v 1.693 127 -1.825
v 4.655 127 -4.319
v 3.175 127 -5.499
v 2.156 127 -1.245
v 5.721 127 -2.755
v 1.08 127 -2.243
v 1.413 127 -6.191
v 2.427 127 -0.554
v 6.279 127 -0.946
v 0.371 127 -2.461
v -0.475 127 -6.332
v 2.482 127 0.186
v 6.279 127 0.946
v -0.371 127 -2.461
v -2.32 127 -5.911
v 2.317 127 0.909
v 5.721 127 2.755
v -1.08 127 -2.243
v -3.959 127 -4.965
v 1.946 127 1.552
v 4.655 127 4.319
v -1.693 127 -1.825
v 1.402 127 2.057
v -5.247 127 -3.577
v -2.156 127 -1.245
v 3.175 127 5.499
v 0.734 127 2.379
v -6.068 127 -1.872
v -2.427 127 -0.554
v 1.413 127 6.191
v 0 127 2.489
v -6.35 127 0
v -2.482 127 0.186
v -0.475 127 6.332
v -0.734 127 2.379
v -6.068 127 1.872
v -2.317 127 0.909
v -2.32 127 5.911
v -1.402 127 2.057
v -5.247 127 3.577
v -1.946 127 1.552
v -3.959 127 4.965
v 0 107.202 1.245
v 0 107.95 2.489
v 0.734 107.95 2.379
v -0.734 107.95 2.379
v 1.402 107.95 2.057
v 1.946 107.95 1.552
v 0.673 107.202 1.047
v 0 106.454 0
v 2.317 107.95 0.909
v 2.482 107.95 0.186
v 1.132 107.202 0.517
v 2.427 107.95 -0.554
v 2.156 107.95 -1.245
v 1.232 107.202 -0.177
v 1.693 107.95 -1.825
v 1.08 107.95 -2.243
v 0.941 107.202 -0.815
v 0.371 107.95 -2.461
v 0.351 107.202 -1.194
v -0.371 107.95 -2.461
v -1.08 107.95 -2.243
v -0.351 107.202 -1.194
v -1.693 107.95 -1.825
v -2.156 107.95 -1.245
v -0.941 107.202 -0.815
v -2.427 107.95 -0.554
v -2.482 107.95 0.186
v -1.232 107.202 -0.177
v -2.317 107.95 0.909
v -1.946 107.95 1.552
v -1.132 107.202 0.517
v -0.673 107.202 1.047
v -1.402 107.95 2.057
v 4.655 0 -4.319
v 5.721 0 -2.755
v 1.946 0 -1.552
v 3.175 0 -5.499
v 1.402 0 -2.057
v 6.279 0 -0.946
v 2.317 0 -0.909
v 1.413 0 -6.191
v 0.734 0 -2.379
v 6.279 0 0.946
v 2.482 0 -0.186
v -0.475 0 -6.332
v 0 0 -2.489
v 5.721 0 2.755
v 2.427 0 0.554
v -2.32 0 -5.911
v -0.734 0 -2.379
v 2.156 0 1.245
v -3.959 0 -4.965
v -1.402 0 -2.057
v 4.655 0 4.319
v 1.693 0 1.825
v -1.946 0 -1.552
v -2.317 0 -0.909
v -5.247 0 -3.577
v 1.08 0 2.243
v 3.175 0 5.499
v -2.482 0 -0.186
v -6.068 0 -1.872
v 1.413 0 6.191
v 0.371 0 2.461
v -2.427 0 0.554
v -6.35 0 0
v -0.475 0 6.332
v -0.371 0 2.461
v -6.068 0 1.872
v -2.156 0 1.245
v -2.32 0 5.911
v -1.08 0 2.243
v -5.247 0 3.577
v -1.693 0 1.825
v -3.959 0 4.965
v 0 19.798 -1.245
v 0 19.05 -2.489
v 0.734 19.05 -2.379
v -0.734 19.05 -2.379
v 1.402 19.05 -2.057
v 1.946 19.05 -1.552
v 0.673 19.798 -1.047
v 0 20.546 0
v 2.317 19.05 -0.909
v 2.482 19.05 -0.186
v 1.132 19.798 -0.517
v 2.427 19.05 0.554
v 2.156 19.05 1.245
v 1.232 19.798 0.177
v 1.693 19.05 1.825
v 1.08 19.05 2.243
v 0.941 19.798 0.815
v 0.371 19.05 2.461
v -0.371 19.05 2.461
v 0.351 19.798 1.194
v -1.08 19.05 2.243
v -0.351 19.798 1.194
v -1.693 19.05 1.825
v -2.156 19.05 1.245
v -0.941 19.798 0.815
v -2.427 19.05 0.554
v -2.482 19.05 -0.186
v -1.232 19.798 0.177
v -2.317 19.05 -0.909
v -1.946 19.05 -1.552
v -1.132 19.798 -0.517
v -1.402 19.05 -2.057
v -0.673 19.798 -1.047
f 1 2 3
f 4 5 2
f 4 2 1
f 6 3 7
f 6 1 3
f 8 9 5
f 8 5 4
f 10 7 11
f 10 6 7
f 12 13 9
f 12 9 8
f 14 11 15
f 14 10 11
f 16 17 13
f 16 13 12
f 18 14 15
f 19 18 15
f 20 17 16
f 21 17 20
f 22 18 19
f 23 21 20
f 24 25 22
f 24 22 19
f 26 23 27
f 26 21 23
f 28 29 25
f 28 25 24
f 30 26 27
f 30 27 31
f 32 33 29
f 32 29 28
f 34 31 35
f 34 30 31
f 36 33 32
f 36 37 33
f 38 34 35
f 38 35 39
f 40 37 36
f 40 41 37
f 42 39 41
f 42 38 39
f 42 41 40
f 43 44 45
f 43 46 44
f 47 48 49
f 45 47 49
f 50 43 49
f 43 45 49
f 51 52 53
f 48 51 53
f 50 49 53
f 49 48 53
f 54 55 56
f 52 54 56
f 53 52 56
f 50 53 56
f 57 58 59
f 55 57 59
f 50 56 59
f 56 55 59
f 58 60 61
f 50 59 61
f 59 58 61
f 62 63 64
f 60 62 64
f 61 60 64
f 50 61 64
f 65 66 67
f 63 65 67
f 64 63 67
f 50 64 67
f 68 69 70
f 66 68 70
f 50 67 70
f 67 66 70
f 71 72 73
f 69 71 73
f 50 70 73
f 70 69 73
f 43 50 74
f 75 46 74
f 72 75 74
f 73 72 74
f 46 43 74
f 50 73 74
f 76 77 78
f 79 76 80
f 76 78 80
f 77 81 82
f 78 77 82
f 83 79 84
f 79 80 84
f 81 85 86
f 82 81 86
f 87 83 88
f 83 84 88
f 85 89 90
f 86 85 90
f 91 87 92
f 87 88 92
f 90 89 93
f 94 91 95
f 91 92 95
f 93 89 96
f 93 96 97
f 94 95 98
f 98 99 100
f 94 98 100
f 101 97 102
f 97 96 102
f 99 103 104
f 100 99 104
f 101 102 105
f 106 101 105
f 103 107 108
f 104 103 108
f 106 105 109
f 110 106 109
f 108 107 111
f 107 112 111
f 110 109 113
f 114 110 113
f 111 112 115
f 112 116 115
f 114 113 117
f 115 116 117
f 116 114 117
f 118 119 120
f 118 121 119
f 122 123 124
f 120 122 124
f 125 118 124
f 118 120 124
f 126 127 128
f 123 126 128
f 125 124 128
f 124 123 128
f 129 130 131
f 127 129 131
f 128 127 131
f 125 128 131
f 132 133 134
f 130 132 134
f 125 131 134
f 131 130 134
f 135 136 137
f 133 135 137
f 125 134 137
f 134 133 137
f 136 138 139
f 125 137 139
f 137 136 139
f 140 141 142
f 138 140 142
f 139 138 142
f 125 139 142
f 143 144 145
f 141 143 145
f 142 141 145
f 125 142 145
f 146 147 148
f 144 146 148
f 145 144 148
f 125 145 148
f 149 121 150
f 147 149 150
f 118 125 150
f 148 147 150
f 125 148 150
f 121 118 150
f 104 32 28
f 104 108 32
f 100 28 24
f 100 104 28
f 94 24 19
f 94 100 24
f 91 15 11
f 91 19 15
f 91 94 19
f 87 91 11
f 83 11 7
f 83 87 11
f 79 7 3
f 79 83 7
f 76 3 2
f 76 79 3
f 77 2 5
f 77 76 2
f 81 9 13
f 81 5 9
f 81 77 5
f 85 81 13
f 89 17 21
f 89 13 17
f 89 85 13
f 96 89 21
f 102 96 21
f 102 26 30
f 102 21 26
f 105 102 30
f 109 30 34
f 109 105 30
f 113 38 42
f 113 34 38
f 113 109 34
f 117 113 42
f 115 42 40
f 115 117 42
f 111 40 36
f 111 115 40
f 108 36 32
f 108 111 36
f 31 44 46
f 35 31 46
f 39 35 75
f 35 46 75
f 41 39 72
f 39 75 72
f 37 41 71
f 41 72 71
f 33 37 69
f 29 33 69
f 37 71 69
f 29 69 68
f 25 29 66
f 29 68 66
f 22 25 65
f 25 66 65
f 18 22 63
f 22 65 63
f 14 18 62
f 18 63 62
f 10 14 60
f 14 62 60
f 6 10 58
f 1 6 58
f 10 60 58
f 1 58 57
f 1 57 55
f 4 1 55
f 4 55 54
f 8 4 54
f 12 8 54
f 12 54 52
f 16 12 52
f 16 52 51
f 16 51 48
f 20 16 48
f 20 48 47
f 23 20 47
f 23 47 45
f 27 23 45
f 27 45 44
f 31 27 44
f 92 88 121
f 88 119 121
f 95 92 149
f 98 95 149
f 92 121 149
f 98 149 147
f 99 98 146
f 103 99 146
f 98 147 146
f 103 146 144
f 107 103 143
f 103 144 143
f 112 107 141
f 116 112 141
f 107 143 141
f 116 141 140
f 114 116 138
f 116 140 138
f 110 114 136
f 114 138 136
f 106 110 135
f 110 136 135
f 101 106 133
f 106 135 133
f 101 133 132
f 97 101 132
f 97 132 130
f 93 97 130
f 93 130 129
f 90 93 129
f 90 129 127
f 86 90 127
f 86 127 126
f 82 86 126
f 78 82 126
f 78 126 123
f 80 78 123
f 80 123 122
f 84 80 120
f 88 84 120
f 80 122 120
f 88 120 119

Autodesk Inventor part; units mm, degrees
ref_plane "YZ Plane" through (0, 0, 0) normal (1, 0, 0) x (0, 1, 0)
ref_plane "XZ Plane" through (0, 0, 0) normal (0, 1, 0) x (-1, 0, 0)
ref_plane "XY Plane" through (0, 0, 0) normal (0, 0, 1) x (1, 0, 0)
sketch "Sketch1" plane through (0, 0, 0) normal (0, 1, 0) x (-1, 0, 0)
  circle A0 centre (0, 0) radius 6.35
  dimension "d0" = 0
  dimension "d1" = 0
  dimension "d2" = 12.7
extrude "Extrusion1" add sketch "Sketch1" along normal blind 127
sketch "Sketch2" plane through (0, 127, 0) normal (0, 1, 0) x (1, 0, 0)
  point P0 (0, 0)
  point P1 (0, 0)
hole "Hole1" at (0, 127, 0) direction (0, -1, 0) diameter 4.9784 depth 19.05 tip angle 118 thread size "1/4-20 UNC" class "2B" standard "ANSI Unified Screw Threads"
sketch "Sketch3" plane through (0, 0, 0) normal (0, -1, 0) x (1, 0, 0)
  circle A0 centre (0, 0) radius 2.4892 projected
hole "Hole2" at (0, 0, 0) direction (0, 1, 0) diameter 4.9784 depth 19.05 tip angle 118 thread size "1/4-20 UNC" class "2B" standard "ANSI Unified Screw Threads"
properties part number "Short Support"
